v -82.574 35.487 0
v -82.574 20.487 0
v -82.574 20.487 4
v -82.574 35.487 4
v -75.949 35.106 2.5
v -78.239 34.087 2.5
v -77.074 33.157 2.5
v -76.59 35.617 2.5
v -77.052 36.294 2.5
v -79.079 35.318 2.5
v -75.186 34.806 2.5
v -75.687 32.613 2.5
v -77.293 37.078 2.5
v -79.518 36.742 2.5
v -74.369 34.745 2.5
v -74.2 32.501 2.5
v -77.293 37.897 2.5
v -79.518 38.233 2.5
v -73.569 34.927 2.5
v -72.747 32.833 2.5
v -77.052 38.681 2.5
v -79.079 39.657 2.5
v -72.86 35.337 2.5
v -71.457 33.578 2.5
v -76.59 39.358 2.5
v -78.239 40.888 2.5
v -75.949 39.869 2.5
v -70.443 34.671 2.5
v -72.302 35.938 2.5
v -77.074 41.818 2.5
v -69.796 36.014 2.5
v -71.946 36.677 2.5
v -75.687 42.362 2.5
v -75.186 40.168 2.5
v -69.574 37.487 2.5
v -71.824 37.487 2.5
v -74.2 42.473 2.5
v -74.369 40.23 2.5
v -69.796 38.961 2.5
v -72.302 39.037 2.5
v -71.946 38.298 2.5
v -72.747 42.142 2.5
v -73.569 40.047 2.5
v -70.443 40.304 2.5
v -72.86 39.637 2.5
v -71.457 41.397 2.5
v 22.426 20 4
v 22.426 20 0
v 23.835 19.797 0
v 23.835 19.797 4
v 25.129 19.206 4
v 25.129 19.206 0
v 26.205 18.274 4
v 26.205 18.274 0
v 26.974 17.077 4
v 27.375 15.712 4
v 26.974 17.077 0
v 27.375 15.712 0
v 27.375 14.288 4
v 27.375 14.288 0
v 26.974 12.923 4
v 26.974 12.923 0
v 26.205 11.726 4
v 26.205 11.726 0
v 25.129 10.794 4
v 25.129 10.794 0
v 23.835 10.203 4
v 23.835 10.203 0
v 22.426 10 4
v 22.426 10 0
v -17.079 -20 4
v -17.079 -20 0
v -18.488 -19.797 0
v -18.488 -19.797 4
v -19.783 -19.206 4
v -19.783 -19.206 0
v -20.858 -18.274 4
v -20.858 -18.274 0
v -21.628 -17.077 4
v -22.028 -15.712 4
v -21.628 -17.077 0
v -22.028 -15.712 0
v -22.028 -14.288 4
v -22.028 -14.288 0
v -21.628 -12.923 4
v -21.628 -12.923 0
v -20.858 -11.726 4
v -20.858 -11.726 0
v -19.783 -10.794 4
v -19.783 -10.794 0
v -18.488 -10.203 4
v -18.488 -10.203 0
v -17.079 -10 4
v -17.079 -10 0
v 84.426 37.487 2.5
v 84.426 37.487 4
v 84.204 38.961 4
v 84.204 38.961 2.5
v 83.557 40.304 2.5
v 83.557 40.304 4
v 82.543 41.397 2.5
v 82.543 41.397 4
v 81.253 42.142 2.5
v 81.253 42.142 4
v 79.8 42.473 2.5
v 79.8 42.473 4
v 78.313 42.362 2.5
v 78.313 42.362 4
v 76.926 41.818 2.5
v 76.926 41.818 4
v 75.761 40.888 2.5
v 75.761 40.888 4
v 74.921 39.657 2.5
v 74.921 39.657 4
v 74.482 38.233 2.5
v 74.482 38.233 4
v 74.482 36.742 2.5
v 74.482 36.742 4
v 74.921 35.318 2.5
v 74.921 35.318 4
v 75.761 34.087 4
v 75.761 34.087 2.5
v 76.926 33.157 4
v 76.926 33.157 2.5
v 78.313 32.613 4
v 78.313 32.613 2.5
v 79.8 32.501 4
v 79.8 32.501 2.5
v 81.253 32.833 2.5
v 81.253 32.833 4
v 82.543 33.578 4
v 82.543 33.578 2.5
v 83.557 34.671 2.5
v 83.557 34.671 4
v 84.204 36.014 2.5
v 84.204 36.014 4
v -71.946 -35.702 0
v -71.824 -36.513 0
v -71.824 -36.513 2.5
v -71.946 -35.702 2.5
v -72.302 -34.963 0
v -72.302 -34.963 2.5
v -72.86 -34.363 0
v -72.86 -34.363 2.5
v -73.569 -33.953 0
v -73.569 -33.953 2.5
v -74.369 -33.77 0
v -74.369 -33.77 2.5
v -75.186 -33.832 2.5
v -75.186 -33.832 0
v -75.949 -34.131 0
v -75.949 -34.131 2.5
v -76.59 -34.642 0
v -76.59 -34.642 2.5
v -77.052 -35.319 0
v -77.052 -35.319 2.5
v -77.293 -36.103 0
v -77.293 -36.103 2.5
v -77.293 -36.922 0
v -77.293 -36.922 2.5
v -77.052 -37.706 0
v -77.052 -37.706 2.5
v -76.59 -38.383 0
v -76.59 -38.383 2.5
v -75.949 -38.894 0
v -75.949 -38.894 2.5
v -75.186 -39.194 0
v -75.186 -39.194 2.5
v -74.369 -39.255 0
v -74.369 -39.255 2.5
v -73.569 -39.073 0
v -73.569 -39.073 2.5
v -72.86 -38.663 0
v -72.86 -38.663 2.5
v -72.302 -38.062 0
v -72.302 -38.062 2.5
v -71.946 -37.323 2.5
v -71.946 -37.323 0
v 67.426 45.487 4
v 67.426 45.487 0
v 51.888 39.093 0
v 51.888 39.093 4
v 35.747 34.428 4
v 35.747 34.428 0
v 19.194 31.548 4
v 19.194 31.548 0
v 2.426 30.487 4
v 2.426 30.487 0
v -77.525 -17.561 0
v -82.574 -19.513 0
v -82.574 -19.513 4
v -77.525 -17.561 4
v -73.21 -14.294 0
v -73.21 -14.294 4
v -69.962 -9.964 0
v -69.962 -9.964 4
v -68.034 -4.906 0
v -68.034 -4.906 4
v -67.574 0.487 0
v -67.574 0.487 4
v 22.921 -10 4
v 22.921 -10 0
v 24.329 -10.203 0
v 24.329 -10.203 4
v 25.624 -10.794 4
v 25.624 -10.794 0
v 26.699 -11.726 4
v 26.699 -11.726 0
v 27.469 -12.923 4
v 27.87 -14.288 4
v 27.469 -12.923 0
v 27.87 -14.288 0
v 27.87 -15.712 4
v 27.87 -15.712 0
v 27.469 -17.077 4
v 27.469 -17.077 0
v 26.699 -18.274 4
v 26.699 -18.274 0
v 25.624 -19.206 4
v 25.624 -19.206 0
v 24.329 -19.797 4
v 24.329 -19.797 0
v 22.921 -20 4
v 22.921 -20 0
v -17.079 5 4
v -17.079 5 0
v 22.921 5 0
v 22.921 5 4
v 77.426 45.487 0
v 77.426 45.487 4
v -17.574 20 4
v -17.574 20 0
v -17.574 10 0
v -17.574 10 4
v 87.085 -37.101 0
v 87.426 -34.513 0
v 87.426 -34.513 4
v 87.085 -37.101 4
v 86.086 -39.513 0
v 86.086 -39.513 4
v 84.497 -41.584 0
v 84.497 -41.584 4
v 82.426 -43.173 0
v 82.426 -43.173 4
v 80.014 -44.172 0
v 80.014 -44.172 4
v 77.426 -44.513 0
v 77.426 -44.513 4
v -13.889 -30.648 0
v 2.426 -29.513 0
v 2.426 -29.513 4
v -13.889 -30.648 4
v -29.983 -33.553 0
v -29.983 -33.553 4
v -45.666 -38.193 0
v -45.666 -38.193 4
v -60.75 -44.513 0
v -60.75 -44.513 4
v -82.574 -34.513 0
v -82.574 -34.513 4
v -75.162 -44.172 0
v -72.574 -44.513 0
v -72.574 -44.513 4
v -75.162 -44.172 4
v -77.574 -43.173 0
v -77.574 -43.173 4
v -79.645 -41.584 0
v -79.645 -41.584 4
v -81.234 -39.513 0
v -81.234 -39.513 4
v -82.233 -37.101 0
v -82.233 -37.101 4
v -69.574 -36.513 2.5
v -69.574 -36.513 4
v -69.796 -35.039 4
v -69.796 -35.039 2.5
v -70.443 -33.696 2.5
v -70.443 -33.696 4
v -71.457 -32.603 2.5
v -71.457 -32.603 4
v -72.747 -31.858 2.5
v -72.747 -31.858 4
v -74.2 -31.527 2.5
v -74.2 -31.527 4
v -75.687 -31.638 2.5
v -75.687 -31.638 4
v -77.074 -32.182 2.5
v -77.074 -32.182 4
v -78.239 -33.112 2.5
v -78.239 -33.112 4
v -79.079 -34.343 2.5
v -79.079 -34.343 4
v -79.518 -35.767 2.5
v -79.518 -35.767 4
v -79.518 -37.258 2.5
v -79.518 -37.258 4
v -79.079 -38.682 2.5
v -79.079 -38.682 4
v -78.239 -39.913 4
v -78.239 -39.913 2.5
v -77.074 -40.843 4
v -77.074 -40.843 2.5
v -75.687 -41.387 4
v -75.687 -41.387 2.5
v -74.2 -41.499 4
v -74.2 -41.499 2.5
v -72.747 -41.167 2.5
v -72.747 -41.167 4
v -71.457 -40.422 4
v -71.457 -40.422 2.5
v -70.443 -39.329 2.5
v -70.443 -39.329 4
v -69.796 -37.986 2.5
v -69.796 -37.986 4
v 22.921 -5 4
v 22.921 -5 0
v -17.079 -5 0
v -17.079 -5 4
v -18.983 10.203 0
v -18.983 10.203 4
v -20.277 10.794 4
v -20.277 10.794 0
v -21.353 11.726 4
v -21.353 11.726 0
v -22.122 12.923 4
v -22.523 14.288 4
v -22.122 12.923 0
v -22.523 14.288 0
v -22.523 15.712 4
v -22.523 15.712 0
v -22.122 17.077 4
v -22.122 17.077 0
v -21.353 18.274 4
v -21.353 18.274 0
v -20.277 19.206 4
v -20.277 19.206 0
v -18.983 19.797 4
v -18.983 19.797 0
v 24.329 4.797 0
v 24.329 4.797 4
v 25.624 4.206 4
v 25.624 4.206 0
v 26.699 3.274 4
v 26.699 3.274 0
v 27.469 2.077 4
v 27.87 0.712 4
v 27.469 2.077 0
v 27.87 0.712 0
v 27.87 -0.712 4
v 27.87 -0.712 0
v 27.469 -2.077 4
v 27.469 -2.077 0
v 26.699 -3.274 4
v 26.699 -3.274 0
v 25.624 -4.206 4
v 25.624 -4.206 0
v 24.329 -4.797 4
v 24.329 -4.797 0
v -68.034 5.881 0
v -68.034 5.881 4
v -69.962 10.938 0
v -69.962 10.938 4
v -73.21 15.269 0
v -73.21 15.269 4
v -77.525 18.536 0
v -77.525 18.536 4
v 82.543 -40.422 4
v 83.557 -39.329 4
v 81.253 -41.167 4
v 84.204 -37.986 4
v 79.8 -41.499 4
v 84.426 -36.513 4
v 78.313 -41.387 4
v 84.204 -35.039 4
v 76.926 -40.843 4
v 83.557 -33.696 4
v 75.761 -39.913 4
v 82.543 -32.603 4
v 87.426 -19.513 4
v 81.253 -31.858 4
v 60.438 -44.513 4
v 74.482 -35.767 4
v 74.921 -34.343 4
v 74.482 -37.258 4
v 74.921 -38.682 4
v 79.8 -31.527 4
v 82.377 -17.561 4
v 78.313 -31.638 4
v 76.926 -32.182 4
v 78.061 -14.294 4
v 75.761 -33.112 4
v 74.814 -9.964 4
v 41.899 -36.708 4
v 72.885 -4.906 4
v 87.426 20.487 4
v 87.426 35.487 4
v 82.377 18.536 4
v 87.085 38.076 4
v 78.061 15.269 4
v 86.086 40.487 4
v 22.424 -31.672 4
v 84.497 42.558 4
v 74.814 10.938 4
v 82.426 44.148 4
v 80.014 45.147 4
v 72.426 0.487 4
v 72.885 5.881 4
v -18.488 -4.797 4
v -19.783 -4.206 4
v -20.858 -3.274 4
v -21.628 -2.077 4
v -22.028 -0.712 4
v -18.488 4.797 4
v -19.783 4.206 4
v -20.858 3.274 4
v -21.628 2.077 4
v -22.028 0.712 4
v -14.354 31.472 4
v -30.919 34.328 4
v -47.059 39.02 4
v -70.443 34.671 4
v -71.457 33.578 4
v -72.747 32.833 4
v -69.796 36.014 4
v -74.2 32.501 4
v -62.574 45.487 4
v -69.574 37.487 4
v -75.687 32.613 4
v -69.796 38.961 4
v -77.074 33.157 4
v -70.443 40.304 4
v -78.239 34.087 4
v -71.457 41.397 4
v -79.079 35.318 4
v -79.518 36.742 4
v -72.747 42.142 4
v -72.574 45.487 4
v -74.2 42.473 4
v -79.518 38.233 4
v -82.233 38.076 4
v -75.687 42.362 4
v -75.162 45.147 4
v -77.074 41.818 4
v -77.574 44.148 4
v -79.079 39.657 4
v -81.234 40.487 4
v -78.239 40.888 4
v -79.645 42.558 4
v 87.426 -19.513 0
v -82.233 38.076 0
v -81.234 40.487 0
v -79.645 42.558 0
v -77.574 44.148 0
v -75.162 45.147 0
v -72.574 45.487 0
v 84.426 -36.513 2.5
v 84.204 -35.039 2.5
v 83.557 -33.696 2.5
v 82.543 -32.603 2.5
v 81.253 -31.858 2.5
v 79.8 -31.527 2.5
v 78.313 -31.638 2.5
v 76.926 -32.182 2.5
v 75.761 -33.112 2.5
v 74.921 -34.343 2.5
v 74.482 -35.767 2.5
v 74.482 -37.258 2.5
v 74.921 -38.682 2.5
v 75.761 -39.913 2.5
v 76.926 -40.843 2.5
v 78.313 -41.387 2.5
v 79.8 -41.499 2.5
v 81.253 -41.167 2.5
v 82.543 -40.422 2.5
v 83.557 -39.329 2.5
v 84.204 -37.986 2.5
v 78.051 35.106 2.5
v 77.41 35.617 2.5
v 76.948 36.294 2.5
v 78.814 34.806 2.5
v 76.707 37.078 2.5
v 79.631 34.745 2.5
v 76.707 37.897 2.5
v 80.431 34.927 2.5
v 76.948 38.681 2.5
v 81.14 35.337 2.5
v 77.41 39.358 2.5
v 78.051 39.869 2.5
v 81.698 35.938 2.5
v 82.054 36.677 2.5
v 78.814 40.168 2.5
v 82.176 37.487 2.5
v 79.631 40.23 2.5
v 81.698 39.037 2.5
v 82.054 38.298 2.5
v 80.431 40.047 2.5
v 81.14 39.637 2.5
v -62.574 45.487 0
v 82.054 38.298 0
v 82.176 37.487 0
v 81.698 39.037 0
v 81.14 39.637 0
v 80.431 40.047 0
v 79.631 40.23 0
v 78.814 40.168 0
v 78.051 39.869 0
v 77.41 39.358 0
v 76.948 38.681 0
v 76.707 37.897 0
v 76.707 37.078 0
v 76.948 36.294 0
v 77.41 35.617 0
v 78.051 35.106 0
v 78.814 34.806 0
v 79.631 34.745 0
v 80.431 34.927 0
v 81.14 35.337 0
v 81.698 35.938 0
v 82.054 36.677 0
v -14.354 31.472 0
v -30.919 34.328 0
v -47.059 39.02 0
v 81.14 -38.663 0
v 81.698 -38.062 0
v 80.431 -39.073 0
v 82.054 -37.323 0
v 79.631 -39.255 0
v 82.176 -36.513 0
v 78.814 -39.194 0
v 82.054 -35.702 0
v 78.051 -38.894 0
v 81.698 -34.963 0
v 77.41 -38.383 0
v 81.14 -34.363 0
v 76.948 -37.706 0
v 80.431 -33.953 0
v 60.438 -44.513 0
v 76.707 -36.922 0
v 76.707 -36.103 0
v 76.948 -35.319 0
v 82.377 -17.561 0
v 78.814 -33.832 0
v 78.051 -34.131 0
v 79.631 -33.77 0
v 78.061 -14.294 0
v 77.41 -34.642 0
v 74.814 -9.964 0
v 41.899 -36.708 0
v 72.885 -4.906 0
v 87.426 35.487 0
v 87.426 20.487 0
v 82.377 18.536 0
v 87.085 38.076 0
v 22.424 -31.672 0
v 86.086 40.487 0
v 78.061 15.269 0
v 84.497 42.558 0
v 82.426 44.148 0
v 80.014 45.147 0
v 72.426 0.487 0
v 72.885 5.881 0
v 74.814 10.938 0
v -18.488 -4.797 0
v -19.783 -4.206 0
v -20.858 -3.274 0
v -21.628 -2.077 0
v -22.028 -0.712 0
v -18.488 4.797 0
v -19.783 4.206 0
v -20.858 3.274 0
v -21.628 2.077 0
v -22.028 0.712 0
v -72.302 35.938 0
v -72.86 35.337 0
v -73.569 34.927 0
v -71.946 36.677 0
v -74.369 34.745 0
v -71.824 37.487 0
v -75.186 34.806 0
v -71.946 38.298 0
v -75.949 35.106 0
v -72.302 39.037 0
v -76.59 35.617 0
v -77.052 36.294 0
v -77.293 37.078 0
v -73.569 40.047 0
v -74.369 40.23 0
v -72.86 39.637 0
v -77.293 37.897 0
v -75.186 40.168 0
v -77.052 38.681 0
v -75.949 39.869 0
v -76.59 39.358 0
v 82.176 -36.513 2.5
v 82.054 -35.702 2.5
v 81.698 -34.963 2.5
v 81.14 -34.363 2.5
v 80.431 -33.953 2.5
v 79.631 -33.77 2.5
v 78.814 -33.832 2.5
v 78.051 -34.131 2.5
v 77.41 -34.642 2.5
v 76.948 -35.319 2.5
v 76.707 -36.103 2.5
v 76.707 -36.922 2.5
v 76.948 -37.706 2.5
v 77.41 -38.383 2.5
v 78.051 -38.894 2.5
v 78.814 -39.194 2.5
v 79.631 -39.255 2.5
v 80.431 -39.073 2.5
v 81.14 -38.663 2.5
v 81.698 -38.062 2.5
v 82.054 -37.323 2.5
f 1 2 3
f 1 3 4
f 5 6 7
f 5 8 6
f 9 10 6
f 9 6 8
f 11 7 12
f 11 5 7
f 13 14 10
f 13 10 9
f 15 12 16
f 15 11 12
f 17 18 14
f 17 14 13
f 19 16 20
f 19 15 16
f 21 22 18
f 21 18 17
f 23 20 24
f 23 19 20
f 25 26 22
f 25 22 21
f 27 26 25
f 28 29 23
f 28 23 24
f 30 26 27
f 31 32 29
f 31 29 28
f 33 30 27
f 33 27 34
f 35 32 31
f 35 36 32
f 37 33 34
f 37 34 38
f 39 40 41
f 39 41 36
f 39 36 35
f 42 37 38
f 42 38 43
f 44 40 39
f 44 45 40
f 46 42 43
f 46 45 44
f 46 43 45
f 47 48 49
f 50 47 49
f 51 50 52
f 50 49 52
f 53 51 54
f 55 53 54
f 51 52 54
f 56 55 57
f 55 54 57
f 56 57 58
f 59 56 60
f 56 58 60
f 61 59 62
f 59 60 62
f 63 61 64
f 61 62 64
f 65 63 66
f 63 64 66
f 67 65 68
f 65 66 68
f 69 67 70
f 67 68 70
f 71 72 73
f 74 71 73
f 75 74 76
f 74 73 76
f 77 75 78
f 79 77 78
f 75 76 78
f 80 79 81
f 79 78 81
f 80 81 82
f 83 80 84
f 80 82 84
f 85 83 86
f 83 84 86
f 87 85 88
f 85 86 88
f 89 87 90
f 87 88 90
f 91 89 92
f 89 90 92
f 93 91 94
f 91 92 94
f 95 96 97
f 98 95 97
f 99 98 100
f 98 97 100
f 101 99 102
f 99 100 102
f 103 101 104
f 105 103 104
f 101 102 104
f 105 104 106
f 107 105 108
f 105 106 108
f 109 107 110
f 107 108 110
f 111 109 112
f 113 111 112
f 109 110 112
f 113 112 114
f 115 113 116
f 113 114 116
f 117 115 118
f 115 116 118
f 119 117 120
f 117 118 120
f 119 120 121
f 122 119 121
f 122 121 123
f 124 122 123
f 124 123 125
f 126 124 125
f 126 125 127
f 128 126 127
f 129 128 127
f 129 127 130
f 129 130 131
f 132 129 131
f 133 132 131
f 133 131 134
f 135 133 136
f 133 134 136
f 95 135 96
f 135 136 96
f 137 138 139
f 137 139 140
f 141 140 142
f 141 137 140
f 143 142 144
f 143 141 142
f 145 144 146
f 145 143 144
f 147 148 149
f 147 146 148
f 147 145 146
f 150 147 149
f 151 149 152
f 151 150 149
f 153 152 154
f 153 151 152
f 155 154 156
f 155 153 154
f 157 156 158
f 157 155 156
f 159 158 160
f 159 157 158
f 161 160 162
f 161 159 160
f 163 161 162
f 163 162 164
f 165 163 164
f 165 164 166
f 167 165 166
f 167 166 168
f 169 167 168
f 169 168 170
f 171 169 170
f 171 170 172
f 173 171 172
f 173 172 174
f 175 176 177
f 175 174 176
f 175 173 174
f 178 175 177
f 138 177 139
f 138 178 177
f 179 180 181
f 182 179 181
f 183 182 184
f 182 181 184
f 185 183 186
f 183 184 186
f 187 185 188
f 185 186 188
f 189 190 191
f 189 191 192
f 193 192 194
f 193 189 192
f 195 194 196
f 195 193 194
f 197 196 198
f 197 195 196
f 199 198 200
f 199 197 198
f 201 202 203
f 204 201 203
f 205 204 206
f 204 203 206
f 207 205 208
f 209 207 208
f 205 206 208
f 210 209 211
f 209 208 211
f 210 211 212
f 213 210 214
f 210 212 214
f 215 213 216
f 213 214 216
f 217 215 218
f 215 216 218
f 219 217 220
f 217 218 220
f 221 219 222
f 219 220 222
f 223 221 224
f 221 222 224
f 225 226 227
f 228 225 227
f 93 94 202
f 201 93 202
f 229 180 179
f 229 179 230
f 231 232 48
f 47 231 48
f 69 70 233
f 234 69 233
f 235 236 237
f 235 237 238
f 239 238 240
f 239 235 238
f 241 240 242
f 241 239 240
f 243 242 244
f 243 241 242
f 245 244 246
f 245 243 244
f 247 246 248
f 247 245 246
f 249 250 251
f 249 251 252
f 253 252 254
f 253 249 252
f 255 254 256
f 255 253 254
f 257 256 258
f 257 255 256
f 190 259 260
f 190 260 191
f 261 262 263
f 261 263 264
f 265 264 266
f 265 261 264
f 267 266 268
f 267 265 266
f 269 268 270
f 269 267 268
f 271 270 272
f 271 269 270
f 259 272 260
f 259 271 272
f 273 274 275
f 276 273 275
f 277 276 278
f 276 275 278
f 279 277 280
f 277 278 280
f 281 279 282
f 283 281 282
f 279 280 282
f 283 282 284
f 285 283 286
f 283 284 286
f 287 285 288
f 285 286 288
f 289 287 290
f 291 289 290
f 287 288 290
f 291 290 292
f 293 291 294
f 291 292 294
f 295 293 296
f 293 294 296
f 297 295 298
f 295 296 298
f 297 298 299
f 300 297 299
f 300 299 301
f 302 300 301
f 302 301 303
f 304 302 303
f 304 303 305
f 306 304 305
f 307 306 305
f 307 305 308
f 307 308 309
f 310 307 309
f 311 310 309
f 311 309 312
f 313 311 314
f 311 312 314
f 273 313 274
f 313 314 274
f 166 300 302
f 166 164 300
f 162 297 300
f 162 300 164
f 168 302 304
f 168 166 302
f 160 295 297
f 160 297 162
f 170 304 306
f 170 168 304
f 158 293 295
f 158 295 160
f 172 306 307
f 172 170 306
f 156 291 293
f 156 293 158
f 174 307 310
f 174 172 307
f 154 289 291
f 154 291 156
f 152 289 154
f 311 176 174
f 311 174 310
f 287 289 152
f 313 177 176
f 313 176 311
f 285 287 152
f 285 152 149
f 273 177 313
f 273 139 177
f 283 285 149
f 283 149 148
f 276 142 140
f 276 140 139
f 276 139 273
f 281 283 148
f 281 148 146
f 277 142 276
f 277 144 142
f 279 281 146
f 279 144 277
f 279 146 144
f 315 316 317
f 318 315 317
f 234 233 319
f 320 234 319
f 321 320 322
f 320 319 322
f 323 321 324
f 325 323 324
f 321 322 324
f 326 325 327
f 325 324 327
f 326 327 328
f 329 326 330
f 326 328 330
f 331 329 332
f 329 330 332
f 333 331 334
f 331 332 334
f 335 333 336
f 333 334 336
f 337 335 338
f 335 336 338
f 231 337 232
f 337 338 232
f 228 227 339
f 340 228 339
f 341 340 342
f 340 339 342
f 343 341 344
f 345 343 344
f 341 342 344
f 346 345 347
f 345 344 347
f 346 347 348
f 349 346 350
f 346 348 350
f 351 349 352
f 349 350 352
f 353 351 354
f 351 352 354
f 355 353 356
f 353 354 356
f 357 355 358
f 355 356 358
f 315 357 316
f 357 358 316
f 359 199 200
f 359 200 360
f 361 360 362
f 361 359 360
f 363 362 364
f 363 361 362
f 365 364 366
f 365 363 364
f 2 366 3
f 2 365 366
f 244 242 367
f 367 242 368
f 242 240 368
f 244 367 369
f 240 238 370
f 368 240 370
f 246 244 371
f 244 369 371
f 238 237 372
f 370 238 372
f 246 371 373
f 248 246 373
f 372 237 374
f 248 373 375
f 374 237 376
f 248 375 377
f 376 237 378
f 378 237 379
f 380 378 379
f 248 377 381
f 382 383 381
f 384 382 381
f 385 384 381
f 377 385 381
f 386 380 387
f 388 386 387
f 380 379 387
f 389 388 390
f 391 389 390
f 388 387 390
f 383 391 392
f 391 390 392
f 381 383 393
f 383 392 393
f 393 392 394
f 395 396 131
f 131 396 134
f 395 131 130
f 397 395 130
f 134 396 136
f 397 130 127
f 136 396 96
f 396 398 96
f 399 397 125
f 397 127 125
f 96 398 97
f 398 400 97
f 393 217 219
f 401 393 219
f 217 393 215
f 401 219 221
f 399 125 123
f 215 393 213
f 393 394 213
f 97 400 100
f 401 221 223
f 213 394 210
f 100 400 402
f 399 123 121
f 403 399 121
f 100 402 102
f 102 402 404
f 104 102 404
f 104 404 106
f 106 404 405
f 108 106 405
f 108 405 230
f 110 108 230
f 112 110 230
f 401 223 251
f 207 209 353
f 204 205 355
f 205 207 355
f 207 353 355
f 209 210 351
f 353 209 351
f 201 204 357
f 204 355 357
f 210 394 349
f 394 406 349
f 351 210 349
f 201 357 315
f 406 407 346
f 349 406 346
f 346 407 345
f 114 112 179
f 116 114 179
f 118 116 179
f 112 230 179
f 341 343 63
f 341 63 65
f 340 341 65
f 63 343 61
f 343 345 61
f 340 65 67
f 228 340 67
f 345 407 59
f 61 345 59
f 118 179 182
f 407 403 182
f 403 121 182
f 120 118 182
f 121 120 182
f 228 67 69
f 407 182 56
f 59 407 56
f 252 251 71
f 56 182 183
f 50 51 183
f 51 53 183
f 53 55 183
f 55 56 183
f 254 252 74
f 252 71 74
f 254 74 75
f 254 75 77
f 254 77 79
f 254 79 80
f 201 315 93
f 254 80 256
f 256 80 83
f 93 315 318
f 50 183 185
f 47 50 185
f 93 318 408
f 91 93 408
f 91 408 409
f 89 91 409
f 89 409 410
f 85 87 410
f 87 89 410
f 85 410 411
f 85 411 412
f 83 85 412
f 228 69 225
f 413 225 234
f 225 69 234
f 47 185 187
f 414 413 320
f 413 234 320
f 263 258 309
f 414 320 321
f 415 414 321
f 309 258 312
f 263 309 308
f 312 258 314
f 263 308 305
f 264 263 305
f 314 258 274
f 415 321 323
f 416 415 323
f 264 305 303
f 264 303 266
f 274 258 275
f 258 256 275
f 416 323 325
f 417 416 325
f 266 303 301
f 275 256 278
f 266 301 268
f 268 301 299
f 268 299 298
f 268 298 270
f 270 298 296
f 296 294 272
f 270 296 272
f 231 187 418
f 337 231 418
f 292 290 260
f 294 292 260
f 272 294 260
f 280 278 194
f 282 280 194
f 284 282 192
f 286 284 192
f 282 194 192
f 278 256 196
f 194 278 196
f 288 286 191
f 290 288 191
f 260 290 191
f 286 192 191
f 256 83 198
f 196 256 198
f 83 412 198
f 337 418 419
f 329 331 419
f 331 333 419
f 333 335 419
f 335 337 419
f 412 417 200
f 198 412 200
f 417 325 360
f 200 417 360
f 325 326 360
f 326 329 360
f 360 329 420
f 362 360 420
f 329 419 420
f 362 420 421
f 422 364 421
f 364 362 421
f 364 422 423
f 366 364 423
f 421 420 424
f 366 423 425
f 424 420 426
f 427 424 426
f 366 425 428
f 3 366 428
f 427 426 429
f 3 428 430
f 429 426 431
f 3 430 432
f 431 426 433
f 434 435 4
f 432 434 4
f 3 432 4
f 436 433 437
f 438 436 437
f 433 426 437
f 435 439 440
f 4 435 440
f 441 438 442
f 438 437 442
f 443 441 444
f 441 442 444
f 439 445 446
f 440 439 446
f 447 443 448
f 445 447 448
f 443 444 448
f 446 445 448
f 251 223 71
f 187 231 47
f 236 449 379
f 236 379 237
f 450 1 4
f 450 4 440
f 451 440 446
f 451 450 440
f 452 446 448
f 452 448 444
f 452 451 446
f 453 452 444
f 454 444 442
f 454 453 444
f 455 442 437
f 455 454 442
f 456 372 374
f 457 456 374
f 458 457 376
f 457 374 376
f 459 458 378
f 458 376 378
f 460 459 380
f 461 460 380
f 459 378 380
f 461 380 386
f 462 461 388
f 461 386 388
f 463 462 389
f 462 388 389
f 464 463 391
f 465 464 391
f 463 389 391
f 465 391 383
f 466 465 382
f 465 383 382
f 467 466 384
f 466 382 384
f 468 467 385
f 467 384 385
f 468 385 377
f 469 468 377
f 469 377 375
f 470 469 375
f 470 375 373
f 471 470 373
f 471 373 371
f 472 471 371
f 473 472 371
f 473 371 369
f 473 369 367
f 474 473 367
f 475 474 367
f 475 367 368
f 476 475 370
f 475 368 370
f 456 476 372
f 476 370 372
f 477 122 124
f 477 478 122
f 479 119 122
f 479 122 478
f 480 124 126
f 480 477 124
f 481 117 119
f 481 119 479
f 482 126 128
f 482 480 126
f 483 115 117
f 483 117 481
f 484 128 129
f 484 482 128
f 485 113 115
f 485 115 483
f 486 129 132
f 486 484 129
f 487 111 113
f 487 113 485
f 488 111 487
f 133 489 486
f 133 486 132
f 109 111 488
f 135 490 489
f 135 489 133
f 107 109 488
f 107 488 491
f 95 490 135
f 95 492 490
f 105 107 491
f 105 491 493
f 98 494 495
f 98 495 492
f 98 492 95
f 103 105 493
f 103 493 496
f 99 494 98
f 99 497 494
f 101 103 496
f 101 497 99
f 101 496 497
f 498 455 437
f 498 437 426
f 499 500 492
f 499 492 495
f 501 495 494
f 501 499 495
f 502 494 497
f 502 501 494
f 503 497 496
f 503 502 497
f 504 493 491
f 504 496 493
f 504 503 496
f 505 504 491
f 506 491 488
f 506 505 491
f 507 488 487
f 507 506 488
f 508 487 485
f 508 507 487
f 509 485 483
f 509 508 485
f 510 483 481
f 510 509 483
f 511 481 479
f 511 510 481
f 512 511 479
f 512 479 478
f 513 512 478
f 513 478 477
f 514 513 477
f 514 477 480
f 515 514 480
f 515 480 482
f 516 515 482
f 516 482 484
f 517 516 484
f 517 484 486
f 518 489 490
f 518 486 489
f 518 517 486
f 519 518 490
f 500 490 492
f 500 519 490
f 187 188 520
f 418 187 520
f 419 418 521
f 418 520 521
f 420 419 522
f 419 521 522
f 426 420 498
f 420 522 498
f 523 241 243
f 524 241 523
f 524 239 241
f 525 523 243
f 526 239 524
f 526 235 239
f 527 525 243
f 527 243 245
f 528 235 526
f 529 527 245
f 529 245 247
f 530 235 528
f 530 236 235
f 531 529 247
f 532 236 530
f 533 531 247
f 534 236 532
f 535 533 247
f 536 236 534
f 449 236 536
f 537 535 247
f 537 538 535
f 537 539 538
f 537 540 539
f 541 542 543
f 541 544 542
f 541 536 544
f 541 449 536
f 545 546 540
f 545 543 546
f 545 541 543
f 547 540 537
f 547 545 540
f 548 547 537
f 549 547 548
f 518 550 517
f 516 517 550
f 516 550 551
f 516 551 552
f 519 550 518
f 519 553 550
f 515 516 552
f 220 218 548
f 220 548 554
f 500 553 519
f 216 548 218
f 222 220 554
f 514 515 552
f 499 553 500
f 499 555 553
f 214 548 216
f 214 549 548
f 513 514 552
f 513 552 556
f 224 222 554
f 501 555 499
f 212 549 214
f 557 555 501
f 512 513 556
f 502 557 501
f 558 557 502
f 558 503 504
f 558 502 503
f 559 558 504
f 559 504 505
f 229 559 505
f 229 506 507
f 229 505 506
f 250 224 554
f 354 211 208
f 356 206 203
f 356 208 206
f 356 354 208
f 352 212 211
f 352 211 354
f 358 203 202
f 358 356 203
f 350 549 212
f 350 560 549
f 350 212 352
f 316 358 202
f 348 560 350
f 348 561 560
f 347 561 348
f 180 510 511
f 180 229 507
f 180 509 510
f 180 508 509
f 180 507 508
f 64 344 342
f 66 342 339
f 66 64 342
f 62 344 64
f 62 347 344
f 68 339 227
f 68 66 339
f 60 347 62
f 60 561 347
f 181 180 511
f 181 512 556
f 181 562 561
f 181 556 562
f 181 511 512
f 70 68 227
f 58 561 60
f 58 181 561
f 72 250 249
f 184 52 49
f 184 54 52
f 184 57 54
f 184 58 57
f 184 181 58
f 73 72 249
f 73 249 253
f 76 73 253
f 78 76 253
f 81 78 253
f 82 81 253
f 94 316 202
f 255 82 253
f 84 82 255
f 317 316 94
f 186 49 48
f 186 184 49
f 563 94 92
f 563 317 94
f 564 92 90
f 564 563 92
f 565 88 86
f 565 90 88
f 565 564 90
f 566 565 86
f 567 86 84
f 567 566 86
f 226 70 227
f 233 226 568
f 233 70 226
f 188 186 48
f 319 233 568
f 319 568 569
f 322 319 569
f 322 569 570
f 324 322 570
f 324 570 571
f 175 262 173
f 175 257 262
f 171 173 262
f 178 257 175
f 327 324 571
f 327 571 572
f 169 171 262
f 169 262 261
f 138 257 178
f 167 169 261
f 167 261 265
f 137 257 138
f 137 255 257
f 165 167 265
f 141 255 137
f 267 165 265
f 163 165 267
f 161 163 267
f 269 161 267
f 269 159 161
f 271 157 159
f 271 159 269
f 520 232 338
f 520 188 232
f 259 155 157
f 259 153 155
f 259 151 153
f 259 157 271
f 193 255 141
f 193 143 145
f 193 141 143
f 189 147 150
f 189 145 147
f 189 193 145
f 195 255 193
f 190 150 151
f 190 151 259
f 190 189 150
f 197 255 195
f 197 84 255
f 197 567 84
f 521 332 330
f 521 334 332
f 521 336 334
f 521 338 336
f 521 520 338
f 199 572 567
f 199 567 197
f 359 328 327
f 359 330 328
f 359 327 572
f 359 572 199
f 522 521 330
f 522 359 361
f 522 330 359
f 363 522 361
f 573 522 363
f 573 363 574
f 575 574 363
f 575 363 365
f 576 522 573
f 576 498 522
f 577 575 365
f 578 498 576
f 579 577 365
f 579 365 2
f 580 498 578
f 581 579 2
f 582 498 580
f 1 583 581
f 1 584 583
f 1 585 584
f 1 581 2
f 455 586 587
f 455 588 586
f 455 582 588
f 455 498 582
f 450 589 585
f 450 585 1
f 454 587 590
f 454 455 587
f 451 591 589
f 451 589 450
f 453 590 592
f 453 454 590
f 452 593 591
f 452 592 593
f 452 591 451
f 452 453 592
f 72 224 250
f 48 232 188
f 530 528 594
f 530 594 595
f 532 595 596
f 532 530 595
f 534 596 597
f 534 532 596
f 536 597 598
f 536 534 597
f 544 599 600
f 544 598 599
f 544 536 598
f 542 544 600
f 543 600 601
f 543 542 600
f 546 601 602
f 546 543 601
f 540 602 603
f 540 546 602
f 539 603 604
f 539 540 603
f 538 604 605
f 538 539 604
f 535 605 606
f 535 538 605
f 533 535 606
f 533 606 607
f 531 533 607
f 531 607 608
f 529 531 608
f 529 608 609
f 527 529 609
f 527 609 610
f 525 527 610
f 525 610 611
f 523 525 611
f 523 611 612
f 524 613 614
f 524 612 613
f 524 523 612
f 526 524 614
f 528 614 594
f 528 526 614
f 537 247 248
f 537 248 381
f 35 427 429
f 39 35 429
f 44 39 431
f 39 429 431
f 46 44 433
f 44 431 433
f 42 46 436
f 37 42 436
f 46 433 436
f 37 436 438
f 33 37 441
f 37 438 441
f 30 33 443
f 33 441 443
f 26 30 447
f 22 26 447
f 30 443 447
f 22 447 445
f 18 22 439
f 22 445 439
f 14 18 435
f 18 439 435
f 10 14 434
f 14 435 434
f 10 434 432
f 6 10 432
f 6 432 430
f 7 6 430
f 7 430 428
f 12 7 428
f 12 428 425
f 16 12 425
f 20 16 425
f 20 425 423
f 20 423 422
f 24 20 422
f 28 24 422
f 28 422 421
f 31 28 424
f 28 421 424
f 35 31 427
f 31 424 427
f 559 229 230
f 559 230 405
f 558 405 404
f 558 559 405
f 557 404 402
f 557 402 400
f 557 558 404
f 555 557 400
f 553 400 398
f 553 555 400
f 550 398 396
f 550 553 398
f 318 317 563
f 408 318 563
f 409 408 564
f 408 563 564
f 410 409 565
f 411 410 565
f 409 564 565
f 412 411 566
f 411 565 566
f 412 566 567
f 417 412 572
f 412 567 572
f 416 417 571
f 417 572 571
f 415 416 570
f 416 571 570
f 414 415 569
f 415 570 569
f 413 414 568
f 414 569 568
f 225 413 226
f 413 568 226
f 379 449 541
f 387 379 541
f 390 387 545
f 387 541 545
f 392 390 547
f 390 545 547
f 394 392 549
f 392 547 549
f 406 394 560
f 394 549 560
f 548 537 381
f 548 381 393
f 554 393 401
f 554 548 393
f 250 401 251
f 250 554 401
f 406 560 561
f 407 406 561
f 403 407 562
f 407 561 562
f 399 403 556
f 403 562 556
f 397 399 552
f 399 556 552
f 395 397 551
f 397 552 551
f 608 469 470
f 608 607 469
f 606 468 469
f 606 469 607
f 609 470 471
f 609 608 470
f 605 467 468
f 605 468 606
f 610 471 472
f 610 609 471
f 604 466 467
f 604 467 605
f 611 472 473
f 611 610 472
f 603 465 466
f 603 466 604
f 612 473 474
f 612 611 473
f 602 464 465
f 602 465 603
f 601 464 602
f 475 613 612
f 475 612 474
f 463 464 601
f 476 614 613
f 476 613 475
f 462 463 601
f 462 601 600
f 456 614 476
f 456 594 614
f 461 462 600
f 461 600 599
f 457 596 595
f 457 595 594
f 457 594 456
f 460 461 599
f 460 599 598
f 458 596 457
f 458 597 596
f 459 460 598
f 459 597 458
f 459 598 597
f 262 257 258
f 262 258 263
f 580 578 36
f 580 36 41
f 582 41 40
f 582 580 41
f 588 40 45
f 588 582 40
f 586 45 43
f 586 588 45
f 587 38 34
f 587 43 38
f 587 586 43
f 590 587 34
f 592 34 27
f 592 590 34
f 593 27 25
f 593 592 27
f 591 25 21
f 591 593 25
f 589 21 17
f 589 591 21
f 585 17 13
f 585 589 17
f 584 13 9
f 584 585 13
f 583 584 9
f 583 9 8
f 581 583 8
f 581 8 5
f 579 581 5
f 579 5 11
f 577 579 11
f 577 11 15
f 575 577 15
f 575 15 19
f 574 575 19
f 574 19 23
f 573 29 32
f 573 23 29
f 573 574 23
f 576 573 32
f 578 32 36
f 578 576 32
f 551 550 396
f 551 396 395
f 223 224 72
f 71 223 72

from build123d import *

# Parameters (mm, degrees)
EXTRUDE_1_DEPTH          = 4
CUT_EXTRUDE_1_DEPTH      = 42
CUT_EXTRUDE_1_DEPTH_BACK = 10
SKETCH_2_R               = 2.75
SKETCH_3_R               = 5
CUT_EXTRUDE_2_DEPTH      = 1.5


with BuildPart() as part:
    # 草图1 → 凸台-拉伸1 (new body)
    with BuildSketch(Plane.XY):
        with BuildLine():
            Line((-72.574116531, 45.487390308), (77.425883469, 45.487390308))
            ThreePointArc((77.425883469, 45.487390308), (84.496951281, 42.558458119), (87.425883469, 35.487390308))
            Line((87.425883469, 35.487390308), (87.425883469, -34.512609692))
            ThreePointArc((87.425883469, -34.512609692), (84.496951281, -41.583677504), (77.425883469, -44.512609692))
            Line((77.425883469, -44.512609692), (-72.574116531, -44.512609692))
            ThreePointArc((-72.574116531, -44.512609692), (-79.645184343, -41.583677504), (-82.574116531, -34.512609692))
            Line((-82.574116531, -34.512609692), (-82.574116531, 35.487390308))
            ThreePointArc((-82.574116531, 35.487390308), (-79.645184343, 42.558458119), (-72.574116531, 45.487390308))
        make_face()
    extrude(amount=EXTRUDE_1_DEPTH)

    # 草图2 → 切除-拉伸1 (cut, two sides: drawn at the far end of the back side and taken through both)
    with BuildSketch(Plane.XY.offset(4).offset(-CUT_EXTRUDE_1_DEPTH_BACK)):
        with Locations((-74.574116531, 37.487390308)):
            Circle(SKETCH_2_R)
        with Locations((-74.574116531, -36.512609692)):
            Circle(SKETCH_2_R)
        with Locations((79.425883469, 37.487390308)):
            Circle(SKETCH_2_R)
        with Locations((79.425883469, -36.512609692)):
            Circle(SKETCH_2_R)
        with BuildLine():
            Line((-60.749662301, -44.512609692), (60.437772164, -44.512609692))
            ThreePointArc((60.437772164, -44.512609692), (32.253211404, -33.835942142), (2.425883469, -29.512609692))
            ThreePointArc((2.425883469, -29.512609692), (-29.983273004, -33.55318593), (-60.749662301, -44.512609692))
        make_face()
        with BuildLine():
            Line((-62.574116531, 45.487390308), (67.425883469, 45.487390308))
            ThreePointArc((67.425883469, 45.487390308), (35.747267057, 34.428061428), (2.425883469, 30.487390308))
            ThreePointArc((2.425883469, 30.487390308), (-30.918540876, 34.328218147), (-62.574116531, 45.487390308))
        make_face()
        with BuildLine():
            Line((87.425883469, 20.487390308), (87.425883469, -19.512609692))
            ThreePointArc((87.425883469, -19.512609692), (76.286181126, -12.242386449), (72.425883469, 0.487390308))
            ThreePointArc((72.425883469, 0.487390308), (76.286181126, 13.217167065), (87.425883469, 20.487390308))
        make_face()
        with BuildLine():
            Line((-82.574116531, 20.487390308), (-82.574116531, -19.512609692))
            ThreePointArc((-82.574116531, -19.512609692), (-71.434414188, -12.242386449), (-67.574116531, 0.487390308))
            ThreePointArc((-67.574116531, 0.487390308), (-71.434414188, 13.217167065), (-82.574116531, 20.487390308))
        make_face()
        with BuildLine():
            Line((-17.574116531, 20), (22.425883469, 20))
            ThreePointArc((22.425883469, 20), (27.425883469, 15), (22.425883469, 10))
            Line((22.425883469, 10), (-17.574116531, 10))
            ThreePointArc((-17.574116531, 10), (-22.574116531, 15), (-17.574116531, 20))
        make_face()
        with BuildLine():
            Line((-17.079364826, 5), (22.920635174, 5))
            ThreePointArc((22.920635174, 5), (27.920635174, 0), (22.920635174, -5))
            Line((22.920635174, -5), (-17.079364826, -5))
            ThreePointArc((-17.079364826, -5), (-22.079364826, 0), (-17.079364826, 5))
        make_face()
        with BuildLine():
            Line((-17.079364826, -10), (22.920635174, -10))
            ThreePointArc((22.920635174, -10), (27.920635174, -15), (22.920635174, -20))
            Line((22.920635174, -20), (-17.079364826, -20))
            ThreePointArc((-17.079364826, -20), (-22.079364826, -15), (-17.079364826, -10))
        make_face()
    extrude(amount=CUT_EXTRUDE_1_DEPTH + CUT_EXTRUDE_1_DEPTH_BACK, mode=Mode.SUBTRACT)

    # 草图3 → 切除-拉伸2 (cut)
    with BuildSketch(Plane.XY.offset(4)):
        with Locations((-74.574116531, 37.487390308)):
            Circle(SKETCH_3_R)
        with Locations((79.425883469, 37.487390308)):
            Circle(SKETCH_3_R)
        with Locations((79.425883469, -36.512609692)):
            Circle(SKETCH_3_R)
        with Locations((-74.574116531, -36.512609692)):
            Circle(SKETCH_3_R)
    extrude(amount=-CUT_EXTRUDE_2_DEPTH, mode=Mode.SUBTRACT)


solid = part.part
